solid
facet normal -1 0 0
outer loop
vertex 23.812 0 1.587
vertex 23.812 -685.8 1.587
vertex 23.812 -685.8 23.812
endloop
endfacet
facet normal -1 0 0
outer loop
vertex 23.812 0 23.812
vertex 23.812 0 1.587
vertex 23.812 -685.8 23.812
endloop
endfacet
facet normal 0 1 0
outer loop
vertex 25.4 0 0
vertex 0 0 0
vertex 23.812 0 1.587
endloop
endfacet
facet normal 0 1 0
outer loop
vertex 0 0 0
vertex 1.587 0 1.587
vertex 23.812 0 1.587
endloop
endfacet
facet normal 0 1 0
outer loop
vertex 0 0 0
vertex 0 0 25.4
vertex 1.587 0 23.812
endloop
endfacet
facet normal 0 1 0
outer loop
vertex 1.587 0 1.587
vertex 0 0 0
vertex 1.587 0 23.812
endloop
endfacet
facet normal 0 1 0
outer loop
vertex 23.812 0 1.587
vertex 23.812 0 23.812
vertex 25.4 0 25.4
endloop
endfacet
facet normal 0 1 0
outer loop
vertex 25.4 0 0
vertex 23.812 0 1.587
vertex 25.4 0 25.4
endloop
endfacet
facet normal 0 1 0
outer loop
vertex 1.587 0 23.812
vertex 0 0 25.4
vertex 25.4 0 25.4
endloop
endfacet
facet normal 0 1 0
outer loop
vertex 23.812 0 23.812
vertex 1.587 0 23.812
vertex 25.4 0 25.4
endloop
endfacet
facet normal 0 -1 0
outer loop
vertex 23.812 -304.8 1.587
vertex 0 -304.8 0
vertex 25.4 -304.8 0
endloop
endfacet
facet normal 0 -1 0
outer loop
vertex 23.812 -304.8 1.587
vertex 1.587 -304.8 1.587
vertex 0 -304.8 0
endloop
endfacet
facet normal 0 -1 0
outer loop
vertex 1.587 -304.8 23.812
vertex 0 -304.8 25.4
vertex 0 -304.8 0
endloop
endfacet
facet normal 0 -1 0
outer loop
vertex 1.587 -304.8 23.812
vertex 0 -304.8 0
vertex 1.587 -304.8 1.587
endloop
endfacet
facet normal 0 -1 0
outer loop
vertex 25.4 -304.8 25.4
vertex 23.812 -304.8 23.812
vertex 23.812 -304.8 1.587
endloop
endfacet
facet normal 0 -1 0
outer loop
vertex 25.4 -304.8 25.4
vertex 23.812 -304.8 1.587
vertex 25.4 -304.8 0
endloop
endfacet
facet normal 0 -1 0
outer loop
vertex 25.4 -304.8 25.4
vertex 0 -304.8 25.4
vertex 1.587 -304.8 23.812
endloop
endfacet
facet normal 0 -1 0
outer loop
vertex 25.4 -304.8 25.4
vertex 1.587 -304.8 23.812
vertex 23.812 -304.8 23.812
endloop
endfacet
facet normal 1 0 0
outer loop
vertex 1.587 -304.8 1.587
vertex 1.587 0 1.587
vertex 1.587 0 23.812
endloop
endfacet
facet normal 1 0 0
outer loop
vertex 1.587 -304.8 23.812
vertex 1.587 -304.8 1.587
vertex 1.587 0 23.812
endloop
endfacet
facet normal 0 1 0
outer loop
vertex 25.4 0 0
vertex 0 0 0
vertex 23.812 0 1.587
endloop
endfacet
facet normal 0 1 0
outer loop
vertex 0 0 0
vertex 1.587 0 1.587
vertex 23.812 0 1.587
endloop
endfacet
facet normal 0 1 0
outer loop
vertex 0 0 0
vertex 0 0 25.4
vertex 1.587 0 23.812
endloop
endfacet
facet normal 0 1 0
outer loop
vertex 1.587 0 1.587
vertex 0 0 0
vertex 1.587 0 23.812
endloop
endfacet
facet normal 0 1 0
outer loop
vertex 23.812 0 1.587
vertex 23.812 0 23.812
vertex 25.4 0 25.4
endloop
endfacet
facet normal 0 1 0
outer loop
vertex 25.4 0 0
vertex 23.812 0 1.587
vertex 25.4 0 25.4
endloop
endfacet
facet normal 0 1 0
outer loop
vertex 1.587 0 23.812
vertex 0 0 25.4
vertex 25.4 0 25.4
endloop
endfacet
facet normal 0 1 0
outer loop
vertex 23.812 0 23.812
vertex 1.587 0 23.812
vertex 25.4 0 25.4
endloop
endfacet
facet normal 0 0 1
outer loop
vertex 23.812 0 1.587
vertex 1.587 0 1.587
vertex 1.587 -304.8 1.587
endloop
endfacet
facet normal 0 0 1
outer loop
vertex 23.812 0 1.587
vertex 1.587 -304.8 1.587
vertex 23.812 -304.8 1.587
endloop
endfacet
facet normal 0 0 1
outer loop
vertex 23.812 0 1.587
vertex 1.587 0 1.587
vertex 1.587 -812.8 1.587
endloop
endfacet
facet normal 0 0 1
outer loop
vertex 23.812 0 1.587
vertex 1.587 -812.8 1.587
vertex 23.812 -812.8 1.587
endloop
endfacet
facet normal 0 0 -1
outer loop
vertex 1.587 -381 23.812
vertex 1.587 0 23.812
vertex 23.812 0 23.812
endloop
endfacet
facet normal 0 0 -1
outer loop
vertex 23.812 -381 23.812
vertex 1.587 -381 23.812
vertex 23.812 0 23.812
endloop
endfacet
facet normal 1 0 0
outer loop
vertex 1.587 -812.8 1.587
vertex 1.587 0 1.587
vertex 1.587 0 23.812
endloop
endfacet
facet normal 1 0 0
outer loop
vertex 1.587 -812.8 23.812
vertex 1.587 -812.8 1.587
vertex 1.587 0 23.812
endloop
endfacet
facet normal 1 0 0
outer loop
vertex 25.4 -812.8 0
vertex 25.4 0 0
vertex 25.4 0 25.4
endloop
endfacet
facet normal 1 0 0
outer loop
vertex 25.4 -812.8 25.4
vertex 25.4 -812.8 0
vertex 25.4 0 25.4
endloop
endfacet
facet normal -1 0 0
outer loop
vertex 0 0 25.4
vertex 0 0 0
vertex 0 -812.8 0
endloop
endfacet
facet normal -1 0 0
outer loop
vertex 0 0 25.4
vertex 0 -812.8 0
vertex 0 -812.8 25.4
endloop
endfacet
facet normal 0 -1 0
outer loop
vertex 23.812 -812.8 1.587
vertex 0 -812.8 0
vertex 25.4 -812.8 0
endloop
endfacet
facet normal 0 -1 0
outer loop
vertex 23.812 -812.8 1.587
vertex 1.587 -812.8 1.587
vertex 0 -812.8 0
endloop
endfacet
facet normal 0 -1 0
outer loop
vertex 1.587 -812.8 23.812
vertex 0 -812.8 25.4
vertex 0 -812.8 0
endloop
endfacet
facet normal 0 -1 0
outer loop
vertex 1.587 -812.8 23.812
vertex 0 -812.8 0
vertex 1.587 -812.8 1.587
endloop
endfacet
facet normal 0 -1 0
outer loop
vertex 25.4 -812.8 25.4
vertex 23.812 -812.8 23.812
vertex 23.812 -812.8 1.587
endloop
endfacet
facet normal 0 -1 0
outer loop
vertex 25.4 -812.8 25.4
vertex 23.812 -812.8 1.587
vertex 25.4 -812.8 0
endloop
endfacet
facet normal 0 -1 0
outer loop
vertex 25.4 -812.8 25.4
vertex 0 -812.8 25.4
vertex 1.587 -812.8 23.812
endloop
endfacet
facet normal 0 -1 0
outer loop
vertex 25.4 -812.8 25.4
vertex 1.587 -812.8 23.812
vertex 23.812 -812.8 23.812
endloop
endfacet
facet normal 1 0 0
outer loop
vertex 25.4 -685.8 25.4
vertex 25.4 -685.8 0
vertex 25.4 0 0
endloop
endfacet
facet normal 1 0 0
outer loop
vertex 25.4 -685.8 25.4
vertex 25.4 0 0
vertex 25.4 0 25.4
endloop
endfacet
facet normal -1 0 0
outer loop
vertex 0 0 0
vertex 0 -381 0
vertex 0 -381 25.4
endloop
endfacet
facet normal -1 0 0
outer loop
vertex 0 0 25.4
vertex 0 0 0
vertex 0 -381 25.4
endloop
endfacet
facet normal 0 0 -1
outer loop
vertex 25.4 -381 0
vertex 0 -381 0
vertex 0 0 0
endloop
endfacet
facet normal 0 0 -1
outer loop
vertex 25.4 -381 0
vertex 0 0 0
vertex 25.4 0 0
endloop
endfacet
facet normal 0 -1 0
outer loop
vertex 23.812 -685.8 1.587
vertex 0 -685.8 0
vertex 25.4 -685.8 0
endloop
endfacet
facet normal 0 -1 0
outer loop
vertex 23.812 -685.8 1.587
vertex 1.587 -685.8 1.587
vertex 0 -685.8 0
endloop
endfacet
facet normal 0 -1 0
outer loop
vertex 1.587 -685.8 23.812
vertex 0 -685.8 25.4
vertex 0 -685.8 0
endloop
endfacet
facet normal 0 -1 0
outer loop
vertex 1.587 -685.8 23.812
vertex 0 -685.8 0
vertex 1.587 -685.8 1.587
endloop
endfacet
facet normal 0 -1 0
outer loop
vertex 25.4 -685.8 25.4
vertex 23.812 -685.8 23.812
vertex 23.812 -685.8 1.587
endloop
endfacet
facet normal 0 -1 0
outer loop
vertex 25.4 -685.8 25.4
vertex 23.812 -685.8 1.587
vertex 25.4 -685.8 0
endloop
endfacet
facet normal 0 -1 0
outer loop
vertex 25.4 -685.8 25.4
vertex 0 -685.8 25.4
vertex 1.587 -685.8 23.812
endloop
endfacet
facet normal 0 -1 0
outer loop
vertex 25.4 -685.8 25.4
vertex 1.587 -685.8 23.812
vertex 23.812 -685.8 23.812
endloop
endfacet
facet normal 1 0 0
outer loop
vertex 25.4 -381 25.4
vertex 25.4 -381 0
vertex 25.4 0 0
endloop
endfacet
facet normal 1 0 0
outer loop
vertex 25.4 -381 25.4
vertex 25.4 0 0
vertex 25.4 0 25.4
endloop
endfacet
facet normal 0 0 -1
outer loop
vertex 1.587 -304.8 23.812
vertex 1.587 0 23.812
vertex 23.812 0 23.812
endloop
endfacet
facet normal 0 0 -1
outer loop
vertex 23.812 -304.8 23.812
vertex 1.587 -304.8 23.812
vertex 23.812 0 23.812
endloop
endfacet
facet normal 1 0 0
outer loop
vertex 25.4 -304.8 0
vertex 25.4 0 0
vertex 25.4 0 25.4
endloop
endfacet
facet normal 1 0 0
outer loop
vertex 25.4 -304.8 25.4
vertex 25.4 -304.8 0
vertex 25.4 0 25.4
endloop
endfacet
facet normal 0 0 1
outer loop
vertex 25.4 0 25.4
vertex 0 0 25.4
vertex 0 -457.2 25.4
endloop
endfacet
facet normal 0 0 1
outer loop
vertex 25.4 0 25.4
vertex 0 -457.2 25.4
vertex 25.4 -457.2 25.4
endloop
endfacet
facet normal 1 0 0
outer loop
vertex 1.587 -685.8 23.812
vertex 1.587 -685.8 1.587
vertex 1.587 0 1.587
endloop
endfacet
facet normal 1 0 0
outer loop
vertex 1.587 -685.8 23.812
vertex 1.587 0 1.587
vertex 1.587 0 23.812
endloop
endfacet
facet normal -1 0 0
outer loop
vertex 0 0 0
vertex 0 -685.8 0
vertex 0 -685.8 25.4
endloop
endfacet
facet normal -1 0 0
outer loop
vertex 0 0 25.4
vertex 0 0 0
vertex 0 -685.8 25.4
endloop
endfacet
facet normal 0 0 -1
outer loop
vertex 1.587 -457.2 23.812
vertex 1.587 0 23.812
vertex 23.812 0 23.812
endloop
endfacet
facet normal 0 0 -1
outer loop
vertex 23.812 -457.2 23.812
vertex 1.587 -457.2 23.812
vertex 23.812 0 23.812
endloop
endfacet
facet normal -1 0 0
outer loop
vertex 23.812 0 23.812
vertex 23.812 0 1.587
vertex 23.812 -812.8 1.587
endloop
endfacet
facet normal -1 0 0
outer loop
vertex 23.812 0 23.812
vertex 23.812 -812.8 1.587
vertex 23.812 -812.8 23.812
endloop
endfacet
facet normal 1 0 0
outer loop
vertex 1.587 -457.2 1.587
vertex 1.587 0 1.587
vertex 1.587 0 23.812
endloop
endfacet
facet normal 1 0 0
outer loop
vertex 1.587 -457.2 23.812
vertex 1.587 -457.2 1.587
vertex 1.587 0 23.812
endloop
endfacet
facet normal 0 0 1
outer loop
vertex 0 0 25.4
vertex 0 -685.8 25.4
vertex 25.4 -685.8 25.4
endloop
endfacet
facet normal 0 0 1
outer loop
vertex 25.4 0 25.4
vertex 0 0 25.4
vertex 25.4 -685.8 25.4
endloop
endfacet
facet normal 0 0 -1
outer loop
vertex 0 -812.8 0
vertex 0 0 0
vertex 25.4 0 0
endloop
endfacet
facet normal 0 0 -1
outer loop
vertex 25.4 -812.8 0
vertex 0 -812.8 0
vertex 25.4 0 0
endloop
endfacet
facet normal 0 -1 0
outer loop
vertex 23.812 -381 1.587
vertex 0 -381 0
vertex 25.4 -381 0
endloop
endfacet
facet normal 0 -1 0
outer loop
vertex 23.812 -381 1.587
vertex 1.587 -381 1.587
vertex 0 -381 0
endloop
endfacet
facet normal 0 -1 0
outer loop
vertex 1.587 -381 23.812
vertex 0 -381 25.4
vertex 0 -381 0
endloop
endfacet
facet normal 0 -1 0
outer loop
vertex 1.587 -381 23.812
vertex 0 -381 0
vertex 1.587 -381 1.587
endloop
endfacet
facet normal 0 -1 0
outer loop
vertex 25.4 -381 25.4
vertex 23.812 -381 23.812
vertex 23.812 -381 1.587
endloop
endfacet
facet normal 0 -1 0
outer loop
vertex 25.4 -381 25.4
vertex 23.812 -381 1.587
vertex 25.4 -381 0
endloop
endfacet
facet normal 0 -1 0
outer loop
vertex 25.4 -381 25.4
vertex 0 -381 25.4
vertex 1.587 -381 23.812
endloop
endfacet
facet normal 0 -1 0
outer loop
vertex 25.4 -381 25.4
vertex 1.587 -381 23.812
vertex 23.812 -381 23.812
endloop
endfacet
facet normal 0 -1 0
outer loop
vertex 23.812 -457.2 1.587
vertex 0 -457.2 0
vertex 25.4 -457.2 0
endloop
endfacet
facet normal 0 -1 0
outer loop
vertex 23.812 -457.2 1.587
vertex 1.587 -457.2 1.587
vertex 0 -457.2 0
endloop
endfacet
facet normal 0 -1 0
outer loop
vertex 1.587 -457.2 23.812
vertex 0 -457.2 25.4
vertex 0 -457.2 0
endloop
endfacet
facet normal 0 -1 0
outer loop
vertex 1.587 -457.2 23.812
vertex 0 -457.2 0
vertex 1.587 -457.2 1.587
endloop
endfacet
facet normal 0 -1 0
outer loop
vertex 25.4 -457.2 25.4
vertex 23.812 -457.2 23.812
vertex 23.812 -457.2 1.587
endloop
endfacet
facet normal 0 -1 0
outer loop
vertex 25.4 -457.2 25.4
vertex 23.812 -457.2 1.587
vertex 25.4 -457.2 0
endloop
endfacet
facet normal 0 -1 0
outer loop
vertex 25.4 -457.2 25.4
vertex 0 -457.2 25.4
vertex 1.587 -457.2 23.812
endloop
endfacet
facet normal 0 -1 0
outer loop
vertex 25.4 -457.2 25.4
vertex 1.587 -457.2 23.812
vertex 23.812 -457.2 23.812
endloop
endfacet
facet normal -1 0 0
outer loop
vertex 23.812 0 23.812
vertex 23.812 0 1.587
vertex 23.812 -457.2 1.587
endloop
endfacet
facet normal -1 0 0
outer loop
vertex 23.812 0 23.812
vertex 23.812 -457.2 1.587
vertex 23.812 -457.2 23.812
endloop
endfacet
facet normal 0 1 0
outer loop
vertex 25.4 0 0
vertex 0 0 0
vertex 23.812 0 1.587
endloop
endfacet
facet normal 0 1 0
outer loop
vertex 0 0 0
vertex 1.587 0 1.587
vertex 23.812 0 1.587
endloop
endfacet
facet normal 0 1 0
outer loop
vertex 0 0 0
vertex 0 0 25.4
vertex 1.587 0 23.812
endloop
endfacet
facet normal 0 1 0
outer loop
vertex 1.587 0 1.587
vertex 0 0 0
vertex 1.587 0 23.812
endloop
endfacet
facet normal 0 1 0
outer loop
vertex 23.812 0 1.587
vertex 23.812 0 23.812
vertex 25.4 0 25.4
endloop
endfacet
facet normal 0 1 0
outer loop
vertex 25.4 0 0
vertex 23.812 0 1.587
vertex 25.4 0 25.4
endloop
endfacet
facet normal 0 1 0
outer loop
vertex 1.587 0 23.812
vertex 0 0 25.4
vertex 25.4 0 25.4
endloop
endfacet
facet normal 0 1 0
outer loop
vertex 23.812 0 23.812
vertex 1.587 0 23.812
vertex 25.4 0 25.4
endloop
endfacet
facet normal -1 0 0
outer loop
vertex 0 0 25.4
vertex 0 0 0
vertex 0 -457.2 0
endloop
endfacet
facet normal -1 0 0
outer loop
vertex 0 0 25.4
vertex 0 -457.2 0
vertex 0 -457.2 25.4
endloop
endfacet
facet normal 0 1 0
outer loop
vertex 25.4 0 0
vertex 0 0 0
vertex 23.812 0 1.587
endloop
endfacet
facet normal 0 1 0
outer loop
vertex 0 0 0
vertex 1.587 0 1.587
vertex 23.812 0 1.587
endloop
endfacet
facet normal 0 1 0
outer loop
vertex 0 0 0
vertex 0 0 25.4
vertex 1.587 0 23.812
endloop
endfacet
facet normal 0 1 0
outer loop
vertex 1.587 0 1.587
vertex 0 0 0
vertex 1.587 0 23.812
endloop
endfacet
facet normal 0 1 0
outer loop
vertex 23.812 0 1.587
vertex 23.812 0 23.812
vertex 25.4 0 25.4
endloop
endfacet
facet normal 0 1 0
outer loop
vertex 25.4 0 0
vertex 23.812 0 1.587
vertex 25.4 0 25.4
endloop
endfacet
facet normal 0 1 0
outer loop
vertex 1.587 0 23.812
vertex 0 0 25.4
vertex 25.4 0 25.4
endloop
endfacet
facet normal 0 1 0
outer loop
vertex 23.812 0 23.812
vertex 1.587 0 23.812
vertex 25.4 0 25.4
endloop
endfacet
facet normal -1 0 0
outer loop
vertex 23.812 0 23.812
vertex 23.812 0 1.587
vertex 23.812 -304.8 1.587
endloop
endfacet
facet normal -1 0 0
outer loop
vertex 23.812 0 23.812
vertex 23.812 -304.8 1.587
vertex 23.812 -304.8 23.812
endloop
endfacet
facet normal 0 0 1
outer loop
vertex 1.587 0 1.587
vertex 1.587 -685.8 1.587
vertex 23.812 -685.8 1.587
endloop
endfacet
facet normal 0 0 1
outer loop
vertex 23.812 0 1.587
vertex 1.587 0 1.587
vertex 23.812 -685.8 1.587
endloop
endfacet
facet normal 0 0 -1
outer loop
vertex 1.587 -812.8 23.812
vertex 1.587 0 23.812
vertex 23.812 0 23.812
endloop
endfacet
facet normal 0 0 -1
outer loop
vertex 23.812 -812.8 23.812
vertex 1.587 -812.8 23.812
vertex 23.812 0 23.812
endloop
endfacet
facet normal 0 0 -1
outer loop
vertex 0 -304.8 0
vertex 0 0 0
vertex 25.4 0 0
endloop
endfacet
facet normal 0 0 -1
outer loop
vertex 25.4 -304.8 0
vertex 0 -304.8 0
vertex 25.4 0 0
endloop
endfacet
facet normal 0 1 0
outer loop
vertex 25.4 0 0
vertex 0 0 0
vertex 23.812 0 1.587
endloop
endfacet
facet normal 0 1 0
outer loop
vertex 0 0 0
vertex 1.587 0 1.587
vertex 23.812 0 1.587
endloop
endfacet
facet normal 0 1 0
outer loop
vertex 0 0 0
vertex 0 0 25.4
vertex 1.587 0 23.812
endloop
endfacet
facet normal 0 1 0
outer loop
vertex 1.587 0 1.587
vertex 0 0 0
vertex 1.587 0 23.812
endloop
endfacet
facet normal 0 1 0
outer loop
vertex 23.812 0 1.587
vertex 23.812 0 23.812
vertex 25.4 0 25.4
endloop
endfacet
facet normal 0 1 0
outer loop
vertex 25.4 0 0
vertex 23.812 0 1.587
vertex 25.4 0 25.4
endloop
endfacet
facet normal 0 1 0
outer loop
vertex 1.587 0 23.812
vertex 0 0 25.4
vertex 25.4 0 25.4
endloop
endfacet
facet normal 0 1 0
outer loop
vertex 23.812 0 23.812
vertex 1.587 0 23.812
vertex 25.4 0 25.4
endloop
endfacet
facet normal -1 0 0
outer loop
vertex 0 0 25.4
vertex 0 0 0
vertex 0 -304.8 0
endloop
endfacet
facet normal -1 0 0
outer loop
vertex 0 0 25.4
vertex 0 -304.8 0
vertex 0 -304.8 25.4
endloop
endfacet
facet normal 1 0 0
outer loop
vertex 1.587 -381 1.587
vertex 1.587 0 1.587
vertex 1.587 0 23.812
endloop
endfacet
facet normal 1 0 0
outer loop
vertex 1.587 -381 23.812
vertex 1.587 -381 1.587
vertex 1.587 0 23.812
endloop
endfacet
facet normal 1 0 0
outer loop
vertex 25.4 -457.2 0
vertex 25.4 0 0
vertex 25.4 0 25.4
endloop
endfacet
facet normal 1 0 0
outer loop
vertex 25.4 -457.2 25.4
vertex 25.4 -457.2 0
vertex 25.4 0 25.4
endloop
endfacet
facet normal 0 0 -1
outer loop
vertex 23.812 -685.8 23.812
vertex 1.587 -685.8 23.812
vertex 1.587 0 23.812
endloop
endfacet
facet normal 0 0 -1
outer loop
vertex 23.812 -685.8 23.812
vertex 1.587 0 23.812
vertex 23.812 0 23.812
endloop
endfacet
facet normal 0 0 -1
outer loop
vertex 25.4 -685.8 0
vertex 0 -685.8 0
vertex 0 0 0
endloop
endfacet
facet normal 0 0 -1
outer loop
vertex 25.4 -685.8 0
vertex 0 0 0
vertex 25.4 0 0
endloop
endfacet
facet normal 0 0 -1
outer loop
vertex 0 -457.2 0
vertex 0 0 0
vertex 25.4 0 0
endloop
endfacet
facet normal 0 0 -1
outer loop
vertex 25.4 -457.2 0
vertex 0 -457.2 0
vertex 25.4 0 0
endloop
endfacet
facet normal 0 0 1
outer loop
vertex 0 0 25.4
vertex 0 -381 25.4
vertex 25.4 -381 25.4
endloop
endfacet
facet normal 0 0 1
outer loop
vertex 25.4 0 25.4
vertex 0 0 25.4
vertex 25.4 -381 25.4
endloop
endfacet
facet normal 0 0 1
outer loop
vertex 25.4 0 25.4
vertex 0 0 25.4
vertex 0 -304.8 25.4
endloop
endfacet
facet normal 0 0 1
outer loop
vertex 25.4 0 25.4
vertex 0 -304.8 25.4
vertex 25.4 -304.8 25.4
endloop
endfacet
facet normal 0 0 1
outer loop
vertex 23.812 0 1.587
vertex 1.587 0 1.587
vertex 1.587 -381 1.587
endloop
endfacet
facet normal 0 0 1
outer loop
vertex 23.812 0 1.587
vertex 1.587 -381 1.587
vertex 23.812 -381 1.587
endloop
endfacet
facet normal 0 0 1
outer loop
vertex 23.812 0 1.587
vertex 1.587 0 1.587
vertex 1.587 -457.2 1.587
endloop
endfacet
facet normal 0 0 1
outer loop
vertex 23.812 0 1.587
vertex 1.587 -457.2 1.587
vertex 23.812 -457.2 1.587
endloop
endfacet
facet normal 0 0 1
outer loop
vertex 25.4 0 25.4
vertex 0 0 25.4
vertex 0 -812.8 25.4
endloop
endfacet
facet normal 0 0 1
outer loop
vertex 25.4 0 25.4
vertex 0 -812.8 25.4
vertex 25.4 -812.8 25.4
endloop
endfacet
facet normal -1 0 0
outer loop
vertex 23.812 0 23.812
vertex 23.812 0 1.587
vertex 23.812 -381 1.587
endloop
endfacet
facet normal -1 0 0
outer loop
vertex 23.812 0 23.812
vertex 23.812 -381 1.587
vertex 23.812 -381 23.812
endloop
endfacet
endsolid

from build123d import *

# Parameters (mm, degrees)
F0_W     = 25.4
F0_H     = 25.4
F0_W_2   = 22.225
F0_H_2   = 22.225
F1_DEPTH = 304.8
F2_DEPTH = 812.8
F3_DEPTH = 685.8
F4_DEPTH = 457.2
F5_DEPTH = 381


with BuildPart() as f1:
    # F0 (on Front) → F1 (new body)
    with BuildSketch(Plane.XZ):
        with Locations((12.7, 12.7)):
            Rectangle(F0_W, F0_H)
        with Locations((12.7, 12.7)):
            Rectangle(F0_W_2, F0_H_2, mode=Mode.SUBTRACT)
    extrude(amount=F1_DEPTH)


with BuildPart() as f2:
    # F0 (on Front) → F2 (new body)
    with BuildSketch(Plane.XZ):
        with Locations((12.7, 12.7)):
            Rectangle(F0_W, F0_H)
        with Locations((12.7, 12.7)):
            Rectangle(F0_W_2, F0_H_2, mode=Mode.SUBTRACT)
    extrude(amount=F2_DEPTH)


with BuildPart() as f3:
    # F0 (on Front) → F3 (new body)
    with BuildSketch(Plane.XZ):
        with Locations((12.7, 12.7)):
            Rectangle(F0_W, F0_H)
        with Locations((12.7, 12.7)):
            Rectangle(F0_W_2, F0_H_2, mode=Mode.SUBTRACT)
    extrude(amount=F3_DEPTH)


with BuildPart() as f4:
    # F0 (on Front) → F4 (new body)
    with BuildSketch(Plane.XZ):
        with Locations((12.7, 12.7)):
            Rectangle(F0_W, F0_H)
        with Locations((12.7, 12.7)):
            Rectangle(F0_W_2, F0_H_2, mode=Mode.SUBTRACT)
    extrude(amount=F4_DEPTH)


with BuildPart() as f5:
    # F0 (on Front) → F5 (new body)
    with BuildSketch(Plane.XZ):
        with Locations((12.7, 12.7)):
            Rectangle(F0_W, F0_H)
        with Locations((12.7, 12.7)):
            Rectangle(F0_W_2, F0_H_2, mode=Mode.SUBTRACT)
    extrude(amount=F5_DEPTH)


solid = Compound([f1.part, f2.part, f3.part, f4.part, f5.part])
